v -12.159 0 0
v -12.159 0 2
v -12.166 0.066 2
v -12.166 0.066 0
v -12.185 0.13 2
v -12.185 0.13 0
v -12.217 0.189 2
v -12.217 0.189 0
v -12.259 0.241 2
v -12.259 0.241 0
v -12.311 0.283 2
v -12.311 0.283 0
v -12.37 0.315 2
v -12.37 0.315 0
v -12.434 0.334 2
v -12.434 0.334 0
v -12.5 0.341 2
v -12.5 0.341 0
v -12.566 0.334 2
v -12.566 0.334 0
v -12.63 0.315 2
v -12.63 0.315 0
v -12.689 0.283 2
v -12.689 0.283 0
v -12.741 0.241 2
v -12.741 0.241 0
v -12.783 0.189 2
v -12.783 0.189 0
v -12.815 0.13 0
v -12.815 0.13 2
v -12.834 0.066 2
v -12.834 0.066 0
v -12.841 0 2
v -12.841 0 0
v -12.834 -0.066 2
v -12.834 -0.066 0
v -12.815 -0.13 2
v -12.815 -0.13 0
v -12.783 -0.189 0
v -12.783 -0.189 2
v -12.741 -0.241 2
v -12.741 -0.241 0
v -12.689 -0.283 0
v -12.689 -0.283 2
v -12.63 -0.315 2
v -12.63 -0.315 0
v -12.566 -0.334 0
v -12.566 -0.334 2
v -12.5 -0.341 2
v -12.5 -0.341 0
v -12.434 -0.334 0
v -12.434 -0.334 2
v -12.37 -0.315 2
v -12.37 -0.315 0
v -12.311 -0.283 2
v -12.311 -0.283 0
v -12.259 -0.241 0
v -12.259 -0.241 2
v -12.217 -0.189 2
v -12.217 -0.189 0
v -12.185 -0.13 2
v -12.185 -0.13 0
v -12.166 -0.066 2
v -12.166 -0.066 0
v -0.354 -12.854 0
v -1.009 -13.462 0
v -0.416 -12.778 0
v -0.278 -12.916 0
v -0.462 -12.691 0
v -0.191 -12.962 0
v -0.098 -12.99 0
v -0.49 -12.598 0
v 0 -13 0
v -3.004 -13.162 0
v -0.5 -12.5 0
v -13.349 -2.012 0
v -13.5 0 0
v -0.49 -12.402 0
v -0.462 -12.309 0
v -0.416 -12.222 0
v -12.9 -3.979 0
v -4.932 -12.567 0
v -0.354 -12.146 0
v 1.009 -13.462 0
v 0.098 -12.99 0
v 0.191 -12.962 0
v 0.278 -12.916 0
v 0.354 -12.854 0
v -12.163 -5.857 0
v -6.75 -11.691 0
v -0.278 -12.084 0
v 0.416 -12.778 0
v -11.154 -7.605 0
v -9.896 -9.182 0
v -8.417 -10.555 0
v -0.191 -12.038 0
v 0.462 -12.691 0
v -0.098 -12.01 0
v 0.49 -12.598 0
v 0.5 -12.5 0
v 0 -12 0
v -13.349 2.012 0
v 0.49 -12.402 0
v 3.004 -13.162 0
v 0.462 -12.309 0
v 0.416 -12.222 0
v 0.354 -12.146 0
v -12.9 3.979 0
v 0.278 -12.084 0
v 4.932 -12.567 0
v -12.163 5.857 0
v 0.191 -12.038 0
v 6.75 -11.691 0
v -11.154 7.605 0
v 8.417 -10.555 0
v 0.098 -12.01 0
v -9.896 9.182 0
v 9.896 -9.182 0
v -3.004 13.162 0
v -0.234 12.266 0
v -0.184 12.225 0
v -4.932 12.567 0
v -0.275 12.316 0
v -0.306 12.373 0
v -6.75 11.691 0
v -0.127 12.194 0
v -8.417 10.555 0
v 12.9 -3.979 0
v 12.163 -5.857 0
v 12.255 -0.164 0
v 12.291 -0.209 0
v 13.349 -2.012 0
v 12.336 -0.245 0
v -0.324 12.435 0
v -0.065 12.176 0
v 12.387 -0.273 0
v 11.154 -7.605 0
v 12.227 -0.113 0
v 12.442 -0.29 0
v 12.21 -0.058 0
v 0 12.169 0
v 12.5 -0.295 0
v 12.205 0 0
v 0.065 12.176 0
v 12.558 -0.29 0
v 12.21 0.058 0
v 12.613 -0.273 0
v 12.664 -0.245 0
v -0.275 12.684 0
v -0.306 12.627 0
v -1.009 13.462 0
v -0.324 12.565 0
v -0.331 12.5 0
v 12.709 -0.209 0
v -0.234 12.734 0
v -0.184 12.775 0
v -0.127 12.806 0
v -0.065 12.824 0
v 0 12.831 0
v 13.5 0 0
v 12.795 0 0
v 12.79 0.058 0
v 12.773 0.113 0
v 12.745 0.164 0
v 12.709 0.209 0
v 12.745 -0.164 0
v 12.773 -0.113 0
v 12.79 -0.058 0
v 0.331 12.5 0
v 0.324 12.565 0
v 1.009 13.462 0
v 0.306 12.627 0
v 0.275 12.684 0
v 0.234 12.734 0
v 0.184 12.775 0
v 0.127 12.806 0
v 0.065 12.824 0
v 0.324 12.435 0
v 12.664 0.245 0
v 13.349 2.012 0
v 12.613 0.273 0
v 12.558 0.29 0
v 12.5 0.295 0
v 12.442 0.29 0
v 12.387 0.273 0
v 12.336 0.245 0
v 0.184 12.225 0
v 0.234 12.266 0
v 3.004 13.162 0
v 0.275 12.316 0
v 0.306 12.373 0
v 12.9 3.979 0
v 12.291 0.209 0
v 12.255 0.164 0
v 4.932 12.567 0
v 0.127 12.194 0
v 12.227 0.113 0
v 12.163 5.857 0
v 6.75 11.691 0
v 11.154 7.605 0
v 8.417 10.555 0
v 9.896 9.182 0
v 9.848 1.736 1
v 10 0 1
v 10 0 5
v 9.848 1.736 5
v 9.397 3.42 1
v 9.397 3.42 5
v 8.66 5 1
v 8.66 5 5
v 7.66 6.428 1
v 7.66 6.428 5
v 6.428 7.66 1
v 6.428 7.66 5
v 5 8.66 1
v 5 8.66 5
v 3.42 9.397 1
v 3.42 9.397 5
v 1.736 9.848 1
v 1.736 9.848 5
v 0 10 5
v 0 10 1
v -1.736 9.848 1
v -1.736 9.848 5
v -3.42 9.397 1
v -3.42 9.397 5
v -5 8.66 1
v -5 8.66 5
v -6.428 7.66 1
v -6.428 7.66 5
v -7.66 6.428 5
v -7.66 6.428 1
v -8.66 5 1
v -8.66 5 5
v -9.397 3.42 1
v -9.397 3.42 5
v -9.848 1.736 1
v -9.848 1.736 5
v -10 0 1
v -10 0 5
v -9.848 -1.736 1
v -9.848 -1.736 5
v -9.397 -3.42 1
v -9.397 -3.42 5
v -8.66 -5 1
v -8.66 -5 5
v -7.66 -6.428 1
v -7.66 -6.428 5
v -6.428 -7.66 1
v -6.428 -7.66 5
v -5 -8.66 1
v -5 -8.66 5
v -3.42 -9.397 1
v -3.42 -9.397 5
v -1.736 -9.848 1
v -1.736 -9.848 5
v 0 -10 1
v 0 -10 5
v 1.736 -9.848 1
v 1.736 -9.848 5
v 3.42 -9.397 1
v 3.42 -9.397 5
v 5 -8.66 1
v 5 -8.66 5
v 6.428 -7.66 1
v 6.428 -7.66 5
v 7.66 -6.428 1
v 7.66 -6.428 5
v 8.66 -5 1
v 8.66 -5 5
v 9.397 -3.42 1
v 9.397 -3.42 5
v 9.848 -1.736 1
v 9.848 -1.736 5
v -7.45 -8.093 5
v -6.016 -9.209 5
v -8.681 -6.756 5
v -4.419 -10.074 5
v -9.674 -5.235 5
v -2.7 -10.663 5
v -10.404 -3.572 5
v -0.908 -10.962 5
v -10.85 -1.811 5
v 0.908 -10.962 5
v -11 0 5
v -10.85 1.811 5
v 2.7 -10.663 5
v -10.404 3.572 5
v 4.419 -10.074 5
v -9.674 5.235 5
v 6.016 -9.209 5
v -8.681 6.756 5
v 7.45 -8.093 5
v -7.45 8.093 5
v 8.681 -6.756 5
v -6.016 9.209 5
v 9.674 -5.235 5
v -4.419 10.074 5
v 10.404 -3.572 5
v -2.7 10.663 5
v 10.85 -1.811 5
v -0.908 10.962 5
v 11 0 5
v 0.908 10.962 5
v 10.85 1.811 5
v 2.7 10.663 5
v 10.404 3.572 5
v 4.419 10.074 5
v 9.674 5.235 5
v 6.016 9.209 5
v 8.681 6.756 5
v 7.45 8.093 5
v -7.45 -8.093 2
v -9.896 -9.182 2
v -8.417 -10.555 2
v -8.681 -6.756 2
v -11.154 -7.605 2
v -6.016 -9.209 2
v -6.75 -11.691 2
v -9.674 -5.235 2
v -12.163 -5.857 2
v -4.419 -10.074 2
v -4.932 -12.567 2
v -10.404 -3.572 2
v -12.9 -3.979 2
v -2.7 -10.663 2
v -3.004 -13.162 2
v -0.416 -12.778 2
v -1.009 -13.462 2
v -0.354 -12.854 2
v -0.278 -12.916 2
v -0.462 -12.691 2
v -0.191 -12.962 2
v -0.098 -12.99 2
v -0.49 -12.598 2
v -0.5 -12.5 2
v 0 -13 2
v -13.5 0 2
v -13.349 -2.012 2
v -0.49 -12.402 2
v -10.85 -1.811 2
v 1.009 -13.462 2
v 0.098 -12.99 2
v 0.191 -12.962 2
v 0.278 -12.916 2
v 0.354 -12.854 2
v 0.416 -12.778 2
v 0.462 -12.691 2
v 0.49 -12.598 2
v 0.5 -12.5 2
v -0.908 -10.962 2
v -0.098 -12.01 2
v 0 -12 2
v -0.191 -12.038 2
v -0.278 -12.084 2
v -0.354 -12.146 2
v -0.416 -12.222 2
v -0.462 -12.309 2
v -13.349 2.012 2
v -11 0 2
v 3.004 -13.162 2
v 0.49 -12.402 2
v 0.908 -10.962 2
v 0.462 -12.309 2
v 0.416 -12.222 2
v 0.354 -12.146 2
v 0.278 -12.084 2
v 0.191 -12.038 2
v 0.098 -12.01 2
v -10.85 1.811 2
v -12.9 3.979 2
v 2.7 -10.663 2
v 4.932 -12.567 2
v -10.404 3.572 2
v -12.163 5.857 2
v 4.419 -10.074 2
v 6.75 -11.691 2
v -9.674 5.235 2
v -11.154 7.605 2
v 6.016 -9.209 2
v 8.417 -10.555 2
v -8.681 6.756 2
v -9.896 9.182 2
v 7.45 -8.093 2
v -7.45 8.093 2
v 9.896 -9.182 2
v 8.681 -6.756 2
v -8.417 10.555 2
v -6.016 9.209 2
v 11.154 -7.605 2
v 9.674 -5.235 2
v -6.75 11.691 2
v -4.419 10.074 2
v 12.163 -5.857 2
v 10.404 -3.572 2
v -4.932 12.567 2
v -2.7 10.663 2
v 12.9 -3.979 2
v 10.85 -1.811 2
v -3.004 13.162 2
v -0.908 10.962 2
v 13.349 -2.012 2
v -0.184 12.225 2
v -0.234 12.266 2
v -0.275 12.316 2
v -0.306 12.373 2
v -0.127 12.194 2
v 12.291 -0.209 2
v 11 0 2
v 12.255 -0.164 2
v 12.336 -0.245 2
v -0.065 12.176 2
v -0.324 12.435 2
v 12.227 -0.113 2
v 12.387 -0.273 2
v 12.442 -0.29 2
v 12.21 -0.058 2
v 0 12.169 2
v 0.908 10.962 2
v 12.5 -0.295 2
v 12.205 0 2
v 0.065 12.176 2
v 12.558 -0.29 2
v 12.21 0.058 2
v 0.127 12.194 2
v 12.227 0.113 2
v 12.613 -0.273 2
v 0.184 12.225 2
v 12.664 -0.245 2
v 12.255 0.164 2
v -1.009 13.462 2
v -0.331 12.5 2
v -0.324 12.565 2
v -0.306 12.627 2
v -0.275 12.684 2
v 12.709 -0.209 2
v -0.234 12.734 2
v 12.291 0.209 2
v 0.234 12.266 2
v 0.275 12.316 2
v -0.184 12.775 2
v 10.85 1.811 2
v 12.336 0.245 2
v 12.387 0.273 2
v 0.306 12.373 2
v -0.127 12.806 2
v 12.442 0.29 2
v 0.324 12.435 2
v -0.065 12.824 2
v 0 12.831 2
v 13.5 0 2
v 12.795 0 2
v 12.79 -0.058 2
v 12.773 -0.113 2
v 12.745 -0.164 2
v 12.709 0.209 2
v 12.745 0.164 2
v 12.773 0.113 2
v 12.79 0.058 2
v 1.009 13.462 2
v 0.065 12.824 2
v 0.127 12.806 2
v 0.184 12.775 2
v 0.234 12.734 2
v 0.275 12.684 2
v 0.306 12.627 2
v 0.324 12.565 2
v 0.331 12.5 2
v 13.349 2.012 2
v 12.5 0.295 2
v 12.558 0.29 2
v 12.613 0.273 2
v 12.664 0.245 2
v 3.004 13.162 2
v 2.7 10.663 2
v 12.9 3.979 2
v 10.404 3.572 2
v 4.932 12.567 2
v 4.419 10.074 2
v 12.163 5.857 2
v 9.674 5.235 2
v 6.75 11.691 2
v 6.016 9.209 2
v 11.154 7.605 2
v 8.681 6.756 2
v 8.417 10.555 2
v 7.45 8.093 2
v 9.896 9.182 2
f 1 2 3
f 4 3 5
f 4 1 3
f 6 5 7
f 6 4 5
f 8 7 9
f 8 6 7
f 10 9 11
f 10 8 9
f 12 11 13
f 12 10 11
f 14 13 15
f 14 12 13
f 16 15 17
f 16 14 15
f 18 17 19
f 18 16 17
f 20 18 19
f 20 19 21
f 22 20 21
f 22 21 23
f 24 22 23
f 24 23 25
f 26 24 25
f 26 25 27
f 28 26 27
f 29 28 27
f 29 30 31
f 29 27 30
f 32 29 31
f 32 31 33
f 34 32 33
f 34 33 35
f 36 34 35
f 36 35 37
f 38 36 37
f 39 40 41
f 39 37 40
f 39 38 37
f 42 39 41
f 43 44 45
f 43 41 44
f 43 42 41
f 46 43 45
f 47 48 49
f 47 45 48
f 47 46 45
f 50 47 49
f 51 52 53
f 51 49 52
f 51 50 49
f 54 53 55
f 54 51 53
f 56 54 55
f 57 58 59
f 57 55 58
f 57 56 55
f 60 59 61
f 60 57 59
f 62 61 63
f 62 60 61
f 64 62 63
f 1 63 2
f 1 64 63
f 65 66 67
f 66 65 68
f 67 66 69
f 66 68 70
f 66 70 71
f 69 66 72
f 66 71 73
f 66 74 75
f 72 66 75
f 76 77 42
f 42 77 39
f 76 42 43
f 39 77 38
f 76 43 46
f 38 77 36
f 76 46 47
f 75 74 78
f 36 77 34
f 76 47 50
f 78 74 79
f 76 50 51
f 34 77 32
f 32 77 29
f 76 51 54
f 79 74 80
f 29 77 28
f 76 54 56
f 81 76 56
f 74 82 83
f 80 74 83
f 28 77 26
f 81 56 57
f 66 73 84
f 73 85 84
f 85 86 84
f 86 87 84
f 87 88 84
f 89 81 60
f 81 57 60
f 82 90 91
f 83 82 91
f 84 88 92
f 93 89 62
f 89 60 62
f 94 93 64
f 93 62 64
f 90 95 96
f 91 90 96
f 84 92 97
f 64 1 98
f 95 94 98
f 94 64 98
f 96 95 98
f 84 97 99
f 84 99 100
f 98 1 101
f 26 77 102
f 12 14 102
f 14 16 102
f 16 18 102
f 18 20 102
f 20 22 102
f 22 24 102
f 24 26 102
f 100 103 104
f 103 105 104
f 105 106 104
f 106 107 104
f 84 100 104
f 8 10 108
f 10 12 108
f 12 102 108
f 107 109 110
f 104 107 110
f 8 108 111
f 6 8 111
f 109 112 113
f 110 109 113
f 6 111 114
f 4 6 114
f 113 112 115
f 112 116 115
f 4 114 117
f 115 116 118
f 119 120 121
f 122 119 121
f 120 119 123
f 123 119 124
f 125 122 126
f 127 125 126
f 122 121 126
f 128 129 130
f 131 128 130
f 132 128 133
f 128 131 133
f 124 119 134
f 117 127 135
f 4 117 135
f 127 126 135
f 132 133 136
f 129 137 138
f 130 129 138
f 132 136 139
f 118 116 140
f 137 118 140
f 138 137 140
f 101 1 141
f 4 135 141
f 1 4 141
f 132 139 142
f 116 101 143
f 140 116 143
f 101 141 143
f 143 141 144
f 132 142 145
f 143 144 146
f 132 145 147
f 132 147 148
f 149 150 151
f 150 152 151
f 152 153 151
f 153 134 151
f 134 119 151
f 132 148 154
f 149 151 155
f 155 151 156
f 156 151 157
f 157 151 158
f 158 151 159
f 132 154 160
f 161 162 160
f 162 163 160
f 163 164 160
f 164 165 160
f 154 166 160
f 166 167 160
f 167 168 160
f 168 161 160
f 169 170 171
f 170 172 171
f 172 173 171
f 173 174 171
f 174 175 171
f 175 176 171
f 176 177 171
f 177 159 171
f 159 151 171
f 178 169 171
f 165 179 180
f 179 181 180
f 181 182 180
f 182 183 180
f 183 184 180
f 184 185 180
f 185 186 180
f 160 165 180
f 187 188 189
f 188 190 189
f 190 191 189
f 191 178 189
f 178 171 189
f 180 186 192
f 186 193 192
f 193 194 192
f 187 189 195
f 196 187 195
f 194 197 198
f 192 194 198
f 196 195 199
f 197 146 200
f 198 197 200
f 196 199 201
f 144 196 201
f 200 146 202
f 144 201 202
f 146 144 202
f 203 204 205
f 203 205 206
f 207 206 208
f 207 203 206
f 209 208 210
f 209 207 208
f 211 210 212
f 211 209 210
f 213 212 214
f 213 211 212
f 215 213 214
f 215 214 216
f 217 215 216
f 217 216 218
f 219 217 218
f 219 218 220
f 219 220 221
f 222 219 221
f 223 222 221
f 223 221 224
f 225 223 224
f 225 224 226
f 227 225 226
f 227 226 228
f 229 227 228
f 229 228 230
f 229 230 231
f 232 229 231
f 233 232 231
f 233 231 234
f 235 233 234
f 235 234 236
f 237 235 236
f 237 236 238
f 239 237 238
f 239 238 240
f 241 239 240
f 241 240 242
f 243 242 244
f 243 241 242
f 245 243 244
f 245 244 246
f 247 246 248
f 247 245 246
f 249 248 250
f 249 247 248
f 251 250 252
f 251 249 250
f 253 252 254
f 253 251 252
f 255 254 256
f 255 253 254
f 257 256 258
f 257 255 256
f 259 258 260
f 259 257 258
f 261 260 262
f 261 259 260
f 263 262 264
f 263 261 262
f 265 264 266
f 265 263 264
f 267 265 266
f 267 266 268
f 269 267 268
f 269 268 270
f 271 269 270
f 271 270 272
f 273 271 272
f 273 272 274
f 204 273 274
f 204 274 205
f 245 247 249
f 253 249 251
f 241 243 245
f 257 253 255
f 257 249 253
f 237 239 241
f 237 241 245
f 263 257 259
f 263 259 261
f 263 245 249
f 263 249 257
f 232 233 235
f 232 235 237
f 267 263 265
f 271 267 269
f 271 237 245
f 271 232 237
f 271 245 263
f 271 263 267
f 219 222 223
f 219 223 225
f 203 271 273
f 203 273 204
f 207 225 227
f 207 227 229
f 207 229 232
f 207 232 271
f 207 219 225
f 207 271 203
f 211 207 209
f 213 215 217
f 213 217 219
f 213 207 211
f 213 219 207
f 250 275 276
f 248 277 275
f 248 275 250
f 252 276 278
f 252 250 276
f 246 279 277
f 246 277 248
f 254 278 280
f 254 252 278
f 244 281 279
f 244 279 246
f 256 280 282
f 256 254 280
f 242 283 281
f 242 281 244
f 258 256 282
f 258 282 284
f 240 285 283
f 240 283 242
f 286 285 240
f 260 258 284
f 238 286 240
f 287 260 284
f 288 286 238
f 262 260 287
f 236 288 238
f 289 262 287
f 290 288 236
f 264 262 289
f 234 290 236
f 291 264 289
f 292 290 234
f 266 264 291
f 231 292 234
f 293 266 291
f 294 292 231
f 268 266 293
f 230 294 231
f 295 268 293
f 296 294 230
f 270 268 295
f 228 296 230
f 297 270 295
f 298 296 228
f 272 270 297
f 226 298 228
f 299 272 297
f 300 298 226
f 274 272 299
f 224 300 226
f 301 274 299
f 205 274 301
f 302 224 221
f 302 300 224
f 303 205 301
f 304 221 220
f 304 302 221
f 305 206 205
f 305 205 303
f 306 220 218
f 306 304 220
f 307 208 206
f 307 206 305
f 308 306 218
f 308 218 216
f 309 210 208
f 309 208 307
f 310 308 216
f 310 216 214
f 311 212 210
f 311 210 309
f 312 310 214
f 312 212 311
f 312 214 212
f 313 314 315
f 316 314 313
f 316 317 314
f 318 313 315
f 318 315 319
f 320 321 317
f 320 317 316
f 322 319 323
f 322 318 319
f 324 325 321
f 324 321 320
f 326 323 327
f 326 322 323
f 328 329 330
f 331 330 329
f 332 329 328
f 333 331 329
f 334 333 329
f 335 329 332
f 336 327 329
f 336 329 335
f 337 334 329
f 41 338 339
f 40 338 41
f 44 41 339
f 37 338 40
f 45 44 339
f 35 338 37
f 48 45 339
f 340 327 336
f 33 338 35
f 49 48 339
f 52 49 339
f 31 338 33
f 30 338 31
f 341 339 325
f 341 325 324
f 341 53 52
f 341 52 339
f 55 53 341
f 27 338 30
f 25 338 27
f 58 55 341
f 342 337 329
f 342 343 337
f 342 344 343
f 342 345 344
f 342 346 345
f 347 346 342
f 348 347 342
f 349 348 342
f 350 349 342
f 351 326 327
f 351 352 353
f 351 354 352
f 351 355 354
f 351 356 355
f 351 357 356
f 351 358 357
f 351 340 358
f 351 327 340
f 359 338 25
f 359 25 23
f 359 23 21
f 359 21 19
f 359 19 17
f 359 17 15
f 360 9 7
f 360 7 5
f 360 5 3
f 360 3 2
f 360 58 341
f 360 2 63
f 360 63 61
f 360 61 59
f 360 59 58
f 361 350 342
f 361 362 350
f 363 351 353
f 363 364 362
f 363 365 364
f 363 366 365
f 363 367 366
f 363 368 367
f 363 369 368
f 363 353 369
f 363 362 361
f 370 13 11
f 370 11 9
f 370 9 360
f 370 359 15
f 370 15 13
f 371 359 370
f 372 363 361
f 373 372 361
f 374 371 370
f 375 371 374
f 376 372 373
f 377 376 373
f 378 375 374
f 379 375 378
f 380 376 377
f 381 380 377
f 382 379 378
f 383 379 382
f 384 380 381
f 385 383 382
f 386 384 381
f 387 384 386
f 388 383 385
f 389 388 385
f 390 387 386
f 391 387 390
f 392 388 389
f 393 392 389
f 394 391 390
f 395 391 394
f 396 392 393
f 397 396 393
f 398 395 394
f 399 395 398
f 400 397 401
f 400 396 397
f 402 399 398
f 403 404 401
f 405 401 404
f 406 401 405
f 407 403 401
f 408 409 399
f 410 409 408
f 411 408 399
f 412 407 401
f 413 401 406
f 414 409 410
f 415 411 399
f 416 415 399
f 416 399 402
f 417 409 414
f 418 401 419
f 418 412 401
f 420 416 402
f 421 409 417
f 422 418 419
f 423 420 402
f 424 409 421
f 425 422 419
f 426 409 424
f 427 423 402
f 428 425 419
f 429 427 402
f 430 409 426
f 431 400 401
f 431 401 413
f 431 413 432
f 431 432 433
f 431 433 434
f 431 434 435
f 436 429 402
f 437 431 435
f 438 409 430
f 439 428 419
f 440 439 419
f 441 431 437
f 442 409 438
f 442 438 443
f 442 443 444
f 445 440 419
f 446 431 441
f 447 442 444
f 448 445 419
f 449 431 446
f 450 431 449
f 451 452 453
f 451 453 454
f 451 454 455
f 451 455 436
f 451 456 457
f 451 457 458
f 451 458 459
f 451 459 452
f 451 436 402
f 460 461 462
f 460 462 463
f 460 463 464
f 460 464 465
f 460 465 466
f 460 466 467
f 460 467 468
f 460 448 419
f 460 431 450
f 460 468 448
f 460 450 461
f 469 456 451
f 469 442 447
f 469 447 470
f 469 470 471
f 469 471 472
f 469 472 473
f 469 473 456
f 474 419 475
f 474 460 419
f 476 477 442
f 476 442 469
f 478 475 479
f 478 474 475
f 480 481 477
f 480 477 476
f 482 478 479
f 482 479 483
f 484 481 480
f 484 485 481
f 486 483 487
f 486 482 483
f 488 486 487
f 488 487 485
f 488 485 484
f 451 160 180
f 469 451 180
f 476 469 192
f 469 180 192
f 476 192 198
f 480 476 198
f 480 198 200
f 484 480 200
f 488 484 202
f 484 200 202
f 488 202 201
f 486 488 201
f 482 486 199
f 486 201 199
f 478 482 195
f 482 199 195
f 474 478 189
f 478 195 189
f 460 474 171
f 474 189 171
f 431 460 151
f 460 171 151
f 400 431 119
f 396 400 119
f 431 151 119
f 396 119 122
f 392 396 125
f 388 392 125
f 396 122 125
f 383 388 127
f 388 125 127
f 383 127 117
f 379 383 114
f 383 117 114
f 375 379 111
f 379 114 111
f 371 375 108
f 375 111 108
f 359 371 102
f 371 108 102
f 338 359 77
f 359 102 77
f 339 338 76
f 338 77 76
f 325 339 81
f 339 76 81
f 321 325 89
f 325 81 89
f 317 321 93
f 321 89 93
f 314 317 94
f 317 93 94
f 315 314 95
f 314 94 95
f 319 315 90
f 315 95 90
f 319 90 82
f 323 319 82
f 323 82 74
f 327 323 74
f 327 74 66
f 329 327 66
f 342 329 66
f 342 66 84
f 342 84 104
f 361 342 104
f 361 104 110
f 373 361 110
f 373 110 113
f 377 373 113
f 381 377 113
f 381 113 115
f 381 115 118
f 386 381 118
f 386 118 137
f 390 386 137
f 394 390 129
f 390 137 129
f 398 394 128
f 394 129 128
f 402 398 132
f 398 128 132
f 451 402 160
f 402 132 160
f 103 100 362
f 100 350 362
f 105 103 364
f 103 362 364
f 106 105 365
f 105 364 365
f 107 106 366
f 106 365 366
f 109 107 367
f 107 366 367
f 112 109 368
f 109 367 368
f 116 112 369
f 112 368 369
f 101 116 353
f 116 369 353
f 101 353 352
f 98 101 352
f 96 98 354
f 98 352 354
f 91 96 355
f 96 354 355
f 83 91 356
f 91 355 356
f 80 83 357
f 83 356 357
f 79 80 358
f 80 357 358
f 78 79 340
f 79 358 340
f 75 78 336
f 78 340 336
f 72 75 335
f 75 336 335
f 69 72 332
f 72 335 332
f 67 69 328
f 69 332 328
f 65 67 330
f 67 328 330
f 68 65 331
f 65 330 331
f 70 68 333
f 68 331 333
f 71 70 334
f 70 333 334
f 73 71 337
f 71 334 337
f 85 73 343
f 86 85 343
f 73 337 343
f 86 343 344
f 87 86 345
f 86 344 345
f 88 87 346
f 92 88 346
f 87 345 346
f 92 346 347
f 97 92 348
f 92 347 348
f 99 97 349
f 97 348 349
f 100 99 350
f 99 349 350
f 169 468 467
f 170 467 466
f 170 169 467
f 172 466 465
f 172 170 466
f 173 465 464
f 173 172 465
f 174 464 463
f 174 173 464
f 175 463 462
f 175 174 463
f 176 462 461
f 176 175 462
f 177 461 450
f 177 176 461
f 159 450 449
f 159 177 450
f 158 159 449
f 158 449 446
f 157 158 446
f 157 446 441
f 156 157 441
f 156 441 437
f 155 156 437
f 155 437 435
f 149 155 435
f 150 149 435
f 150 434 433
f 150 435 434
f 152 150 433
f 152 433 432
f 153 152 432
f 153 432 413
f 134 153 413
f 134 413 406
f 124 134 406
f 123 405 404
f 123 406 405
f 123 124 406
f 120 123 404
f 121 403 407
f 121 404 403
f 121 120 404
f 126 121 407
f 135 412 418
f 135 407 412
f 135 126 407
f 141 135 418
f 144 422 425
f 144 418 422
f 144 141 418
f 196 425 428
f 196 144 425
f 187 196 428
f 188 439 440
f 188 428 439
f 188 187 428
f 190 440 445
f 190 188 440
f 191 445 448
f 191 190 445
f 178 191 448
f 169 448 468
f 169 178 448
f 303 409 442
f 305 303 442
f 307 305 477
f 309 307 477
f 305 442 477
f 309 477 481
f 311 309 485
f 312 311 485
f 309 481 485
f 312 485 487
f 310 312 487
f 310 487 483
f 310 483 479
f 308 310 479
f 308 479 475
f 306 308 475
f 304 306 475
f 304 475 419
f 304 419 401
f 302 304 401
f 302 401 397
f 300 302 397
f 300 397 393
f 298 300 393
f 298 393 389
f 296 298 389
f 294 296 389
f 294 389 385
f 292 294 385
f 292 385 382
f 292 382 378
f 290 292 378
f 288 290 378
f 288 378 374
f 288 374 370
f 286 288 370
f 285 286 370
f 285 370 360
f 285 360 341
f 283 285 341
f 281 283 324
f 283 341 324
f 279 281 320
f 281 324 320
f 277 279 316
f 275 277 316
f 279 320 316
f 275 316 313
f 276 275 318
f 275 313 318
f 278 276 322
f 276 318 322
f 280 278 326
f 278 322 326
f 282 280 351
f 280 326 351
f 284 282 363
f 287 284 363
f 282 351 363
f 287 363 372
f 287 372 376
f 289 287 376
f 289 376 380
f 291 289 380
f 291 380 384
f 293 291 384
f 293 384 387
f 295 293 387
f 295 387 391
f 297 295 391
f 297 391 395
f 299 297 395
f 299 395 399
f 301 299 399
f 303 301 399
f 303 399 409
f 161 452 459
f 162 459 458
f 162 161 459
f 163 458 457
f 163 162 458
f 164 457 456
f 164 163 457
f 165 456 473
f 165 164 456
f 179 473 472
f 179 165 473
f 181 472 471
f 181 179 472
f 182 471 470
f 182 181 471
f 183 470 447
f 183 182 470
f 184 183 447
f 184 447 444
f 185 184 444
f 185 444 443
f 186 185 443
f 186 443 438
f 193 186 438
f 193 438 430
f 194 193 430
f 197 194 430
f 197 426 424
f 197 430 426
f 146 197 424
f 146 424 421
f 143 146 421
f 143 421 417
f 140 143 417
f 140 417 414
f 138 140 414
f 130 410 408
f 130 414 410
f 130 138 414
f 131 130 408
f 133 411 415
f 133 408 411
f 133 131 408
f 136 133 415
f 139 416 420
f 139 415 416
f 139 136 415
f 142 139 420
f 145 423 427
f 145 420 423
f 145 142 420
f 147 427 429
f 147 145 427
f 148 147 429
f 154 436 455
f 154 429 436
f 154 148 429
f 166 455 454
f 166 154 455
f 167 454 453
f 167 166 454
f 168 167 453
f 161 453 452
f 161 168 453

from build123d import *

# Parameters (mm, degrees)
F0_R     = 11
F1_DEPTH = 5
F0_R_2   = 13.5
F2_DEPTH = 2
F3_T     = 1
F4_R     = 0.3407547834
F4_R_2   = 0.295229786
F4_R_3   = 0.330794191
F4_R_4   = 0.5
F5_DEPTH = 126.8


# Not quite as in the source:
# - a shell that OpenCascade refuses in one call is made with other operations: the cavity is built on its own and cut out


with BuildPart() as f1:
    # F0 (on Top) → F1 (new body)
    with BuildSketch(Plane.XY):
        Circle(F0_R)
    extrude(amount=F1_DEPTH)

    # F0 (on Top) → F2 (join)
    with BuildSketch(Plane.XY):
        Circle(F0_R_2)
        Circle(F0_R, mode=Mode.SUBTRACT)
    extrude(amount=F2_DEPTH)

    # F3: shell of thickness 1, made by hand


with BuildPart() as f3_core1:
    # F3_t2: copy of F1
    add(f1.part)

    # the walls: a layer under each face that stays
    f3_faces = [f3_core1.faces().sort_by_distance(p)[0] for p in [
        (-11, 0, 3.5),
        (-9, -9, 2),
        (-13.5, 0, 1),
        (0, 0, 0),
    ]]
    thicken(f3_faces, amount=-F3_T, mode=Mode.SUBTRACT)

    # F3_s3 → F3_t4 (revolve, cut)
    with BuildSketch(Plane.XZ):
        Polygon((11.01, 2.01), (10, 2), (10, 1), (11, 1), align=None)
    revolve(axis=Axis((0, 0, 2), (0, 0, 1)), mode=Mode.SUBTRACT)


with BuildPart() as f1_1:
    add(f1.part)

    # what is left inside the walls is the cavity
    f3_cavity = [f3_core1.part.solids().sort_by_distance(p)[0] for p in [
        (0, -3.333333, 1.01),
    ]]
    add(f3_cavity, mode=Mode.SUBTRACT)

    # F4 (on face) → F5 (cut, symmetric)
    with BuildSketch(Plane.XY):
        with Locations((-12.5, 0)):
            Circle(F4_R)
        with Locations((12.5, 0)):
            Circle(F4_R_2)
        with Locations((0, 12.5)):
            Circle(F4_R_3)
        with Locations((0, -12.5)):
            Circle(F4_R_4)
    extrude(amount=F5_DEPTH, both=True, mode=Mode.SUBTRACT)


solid = f1_1.part
